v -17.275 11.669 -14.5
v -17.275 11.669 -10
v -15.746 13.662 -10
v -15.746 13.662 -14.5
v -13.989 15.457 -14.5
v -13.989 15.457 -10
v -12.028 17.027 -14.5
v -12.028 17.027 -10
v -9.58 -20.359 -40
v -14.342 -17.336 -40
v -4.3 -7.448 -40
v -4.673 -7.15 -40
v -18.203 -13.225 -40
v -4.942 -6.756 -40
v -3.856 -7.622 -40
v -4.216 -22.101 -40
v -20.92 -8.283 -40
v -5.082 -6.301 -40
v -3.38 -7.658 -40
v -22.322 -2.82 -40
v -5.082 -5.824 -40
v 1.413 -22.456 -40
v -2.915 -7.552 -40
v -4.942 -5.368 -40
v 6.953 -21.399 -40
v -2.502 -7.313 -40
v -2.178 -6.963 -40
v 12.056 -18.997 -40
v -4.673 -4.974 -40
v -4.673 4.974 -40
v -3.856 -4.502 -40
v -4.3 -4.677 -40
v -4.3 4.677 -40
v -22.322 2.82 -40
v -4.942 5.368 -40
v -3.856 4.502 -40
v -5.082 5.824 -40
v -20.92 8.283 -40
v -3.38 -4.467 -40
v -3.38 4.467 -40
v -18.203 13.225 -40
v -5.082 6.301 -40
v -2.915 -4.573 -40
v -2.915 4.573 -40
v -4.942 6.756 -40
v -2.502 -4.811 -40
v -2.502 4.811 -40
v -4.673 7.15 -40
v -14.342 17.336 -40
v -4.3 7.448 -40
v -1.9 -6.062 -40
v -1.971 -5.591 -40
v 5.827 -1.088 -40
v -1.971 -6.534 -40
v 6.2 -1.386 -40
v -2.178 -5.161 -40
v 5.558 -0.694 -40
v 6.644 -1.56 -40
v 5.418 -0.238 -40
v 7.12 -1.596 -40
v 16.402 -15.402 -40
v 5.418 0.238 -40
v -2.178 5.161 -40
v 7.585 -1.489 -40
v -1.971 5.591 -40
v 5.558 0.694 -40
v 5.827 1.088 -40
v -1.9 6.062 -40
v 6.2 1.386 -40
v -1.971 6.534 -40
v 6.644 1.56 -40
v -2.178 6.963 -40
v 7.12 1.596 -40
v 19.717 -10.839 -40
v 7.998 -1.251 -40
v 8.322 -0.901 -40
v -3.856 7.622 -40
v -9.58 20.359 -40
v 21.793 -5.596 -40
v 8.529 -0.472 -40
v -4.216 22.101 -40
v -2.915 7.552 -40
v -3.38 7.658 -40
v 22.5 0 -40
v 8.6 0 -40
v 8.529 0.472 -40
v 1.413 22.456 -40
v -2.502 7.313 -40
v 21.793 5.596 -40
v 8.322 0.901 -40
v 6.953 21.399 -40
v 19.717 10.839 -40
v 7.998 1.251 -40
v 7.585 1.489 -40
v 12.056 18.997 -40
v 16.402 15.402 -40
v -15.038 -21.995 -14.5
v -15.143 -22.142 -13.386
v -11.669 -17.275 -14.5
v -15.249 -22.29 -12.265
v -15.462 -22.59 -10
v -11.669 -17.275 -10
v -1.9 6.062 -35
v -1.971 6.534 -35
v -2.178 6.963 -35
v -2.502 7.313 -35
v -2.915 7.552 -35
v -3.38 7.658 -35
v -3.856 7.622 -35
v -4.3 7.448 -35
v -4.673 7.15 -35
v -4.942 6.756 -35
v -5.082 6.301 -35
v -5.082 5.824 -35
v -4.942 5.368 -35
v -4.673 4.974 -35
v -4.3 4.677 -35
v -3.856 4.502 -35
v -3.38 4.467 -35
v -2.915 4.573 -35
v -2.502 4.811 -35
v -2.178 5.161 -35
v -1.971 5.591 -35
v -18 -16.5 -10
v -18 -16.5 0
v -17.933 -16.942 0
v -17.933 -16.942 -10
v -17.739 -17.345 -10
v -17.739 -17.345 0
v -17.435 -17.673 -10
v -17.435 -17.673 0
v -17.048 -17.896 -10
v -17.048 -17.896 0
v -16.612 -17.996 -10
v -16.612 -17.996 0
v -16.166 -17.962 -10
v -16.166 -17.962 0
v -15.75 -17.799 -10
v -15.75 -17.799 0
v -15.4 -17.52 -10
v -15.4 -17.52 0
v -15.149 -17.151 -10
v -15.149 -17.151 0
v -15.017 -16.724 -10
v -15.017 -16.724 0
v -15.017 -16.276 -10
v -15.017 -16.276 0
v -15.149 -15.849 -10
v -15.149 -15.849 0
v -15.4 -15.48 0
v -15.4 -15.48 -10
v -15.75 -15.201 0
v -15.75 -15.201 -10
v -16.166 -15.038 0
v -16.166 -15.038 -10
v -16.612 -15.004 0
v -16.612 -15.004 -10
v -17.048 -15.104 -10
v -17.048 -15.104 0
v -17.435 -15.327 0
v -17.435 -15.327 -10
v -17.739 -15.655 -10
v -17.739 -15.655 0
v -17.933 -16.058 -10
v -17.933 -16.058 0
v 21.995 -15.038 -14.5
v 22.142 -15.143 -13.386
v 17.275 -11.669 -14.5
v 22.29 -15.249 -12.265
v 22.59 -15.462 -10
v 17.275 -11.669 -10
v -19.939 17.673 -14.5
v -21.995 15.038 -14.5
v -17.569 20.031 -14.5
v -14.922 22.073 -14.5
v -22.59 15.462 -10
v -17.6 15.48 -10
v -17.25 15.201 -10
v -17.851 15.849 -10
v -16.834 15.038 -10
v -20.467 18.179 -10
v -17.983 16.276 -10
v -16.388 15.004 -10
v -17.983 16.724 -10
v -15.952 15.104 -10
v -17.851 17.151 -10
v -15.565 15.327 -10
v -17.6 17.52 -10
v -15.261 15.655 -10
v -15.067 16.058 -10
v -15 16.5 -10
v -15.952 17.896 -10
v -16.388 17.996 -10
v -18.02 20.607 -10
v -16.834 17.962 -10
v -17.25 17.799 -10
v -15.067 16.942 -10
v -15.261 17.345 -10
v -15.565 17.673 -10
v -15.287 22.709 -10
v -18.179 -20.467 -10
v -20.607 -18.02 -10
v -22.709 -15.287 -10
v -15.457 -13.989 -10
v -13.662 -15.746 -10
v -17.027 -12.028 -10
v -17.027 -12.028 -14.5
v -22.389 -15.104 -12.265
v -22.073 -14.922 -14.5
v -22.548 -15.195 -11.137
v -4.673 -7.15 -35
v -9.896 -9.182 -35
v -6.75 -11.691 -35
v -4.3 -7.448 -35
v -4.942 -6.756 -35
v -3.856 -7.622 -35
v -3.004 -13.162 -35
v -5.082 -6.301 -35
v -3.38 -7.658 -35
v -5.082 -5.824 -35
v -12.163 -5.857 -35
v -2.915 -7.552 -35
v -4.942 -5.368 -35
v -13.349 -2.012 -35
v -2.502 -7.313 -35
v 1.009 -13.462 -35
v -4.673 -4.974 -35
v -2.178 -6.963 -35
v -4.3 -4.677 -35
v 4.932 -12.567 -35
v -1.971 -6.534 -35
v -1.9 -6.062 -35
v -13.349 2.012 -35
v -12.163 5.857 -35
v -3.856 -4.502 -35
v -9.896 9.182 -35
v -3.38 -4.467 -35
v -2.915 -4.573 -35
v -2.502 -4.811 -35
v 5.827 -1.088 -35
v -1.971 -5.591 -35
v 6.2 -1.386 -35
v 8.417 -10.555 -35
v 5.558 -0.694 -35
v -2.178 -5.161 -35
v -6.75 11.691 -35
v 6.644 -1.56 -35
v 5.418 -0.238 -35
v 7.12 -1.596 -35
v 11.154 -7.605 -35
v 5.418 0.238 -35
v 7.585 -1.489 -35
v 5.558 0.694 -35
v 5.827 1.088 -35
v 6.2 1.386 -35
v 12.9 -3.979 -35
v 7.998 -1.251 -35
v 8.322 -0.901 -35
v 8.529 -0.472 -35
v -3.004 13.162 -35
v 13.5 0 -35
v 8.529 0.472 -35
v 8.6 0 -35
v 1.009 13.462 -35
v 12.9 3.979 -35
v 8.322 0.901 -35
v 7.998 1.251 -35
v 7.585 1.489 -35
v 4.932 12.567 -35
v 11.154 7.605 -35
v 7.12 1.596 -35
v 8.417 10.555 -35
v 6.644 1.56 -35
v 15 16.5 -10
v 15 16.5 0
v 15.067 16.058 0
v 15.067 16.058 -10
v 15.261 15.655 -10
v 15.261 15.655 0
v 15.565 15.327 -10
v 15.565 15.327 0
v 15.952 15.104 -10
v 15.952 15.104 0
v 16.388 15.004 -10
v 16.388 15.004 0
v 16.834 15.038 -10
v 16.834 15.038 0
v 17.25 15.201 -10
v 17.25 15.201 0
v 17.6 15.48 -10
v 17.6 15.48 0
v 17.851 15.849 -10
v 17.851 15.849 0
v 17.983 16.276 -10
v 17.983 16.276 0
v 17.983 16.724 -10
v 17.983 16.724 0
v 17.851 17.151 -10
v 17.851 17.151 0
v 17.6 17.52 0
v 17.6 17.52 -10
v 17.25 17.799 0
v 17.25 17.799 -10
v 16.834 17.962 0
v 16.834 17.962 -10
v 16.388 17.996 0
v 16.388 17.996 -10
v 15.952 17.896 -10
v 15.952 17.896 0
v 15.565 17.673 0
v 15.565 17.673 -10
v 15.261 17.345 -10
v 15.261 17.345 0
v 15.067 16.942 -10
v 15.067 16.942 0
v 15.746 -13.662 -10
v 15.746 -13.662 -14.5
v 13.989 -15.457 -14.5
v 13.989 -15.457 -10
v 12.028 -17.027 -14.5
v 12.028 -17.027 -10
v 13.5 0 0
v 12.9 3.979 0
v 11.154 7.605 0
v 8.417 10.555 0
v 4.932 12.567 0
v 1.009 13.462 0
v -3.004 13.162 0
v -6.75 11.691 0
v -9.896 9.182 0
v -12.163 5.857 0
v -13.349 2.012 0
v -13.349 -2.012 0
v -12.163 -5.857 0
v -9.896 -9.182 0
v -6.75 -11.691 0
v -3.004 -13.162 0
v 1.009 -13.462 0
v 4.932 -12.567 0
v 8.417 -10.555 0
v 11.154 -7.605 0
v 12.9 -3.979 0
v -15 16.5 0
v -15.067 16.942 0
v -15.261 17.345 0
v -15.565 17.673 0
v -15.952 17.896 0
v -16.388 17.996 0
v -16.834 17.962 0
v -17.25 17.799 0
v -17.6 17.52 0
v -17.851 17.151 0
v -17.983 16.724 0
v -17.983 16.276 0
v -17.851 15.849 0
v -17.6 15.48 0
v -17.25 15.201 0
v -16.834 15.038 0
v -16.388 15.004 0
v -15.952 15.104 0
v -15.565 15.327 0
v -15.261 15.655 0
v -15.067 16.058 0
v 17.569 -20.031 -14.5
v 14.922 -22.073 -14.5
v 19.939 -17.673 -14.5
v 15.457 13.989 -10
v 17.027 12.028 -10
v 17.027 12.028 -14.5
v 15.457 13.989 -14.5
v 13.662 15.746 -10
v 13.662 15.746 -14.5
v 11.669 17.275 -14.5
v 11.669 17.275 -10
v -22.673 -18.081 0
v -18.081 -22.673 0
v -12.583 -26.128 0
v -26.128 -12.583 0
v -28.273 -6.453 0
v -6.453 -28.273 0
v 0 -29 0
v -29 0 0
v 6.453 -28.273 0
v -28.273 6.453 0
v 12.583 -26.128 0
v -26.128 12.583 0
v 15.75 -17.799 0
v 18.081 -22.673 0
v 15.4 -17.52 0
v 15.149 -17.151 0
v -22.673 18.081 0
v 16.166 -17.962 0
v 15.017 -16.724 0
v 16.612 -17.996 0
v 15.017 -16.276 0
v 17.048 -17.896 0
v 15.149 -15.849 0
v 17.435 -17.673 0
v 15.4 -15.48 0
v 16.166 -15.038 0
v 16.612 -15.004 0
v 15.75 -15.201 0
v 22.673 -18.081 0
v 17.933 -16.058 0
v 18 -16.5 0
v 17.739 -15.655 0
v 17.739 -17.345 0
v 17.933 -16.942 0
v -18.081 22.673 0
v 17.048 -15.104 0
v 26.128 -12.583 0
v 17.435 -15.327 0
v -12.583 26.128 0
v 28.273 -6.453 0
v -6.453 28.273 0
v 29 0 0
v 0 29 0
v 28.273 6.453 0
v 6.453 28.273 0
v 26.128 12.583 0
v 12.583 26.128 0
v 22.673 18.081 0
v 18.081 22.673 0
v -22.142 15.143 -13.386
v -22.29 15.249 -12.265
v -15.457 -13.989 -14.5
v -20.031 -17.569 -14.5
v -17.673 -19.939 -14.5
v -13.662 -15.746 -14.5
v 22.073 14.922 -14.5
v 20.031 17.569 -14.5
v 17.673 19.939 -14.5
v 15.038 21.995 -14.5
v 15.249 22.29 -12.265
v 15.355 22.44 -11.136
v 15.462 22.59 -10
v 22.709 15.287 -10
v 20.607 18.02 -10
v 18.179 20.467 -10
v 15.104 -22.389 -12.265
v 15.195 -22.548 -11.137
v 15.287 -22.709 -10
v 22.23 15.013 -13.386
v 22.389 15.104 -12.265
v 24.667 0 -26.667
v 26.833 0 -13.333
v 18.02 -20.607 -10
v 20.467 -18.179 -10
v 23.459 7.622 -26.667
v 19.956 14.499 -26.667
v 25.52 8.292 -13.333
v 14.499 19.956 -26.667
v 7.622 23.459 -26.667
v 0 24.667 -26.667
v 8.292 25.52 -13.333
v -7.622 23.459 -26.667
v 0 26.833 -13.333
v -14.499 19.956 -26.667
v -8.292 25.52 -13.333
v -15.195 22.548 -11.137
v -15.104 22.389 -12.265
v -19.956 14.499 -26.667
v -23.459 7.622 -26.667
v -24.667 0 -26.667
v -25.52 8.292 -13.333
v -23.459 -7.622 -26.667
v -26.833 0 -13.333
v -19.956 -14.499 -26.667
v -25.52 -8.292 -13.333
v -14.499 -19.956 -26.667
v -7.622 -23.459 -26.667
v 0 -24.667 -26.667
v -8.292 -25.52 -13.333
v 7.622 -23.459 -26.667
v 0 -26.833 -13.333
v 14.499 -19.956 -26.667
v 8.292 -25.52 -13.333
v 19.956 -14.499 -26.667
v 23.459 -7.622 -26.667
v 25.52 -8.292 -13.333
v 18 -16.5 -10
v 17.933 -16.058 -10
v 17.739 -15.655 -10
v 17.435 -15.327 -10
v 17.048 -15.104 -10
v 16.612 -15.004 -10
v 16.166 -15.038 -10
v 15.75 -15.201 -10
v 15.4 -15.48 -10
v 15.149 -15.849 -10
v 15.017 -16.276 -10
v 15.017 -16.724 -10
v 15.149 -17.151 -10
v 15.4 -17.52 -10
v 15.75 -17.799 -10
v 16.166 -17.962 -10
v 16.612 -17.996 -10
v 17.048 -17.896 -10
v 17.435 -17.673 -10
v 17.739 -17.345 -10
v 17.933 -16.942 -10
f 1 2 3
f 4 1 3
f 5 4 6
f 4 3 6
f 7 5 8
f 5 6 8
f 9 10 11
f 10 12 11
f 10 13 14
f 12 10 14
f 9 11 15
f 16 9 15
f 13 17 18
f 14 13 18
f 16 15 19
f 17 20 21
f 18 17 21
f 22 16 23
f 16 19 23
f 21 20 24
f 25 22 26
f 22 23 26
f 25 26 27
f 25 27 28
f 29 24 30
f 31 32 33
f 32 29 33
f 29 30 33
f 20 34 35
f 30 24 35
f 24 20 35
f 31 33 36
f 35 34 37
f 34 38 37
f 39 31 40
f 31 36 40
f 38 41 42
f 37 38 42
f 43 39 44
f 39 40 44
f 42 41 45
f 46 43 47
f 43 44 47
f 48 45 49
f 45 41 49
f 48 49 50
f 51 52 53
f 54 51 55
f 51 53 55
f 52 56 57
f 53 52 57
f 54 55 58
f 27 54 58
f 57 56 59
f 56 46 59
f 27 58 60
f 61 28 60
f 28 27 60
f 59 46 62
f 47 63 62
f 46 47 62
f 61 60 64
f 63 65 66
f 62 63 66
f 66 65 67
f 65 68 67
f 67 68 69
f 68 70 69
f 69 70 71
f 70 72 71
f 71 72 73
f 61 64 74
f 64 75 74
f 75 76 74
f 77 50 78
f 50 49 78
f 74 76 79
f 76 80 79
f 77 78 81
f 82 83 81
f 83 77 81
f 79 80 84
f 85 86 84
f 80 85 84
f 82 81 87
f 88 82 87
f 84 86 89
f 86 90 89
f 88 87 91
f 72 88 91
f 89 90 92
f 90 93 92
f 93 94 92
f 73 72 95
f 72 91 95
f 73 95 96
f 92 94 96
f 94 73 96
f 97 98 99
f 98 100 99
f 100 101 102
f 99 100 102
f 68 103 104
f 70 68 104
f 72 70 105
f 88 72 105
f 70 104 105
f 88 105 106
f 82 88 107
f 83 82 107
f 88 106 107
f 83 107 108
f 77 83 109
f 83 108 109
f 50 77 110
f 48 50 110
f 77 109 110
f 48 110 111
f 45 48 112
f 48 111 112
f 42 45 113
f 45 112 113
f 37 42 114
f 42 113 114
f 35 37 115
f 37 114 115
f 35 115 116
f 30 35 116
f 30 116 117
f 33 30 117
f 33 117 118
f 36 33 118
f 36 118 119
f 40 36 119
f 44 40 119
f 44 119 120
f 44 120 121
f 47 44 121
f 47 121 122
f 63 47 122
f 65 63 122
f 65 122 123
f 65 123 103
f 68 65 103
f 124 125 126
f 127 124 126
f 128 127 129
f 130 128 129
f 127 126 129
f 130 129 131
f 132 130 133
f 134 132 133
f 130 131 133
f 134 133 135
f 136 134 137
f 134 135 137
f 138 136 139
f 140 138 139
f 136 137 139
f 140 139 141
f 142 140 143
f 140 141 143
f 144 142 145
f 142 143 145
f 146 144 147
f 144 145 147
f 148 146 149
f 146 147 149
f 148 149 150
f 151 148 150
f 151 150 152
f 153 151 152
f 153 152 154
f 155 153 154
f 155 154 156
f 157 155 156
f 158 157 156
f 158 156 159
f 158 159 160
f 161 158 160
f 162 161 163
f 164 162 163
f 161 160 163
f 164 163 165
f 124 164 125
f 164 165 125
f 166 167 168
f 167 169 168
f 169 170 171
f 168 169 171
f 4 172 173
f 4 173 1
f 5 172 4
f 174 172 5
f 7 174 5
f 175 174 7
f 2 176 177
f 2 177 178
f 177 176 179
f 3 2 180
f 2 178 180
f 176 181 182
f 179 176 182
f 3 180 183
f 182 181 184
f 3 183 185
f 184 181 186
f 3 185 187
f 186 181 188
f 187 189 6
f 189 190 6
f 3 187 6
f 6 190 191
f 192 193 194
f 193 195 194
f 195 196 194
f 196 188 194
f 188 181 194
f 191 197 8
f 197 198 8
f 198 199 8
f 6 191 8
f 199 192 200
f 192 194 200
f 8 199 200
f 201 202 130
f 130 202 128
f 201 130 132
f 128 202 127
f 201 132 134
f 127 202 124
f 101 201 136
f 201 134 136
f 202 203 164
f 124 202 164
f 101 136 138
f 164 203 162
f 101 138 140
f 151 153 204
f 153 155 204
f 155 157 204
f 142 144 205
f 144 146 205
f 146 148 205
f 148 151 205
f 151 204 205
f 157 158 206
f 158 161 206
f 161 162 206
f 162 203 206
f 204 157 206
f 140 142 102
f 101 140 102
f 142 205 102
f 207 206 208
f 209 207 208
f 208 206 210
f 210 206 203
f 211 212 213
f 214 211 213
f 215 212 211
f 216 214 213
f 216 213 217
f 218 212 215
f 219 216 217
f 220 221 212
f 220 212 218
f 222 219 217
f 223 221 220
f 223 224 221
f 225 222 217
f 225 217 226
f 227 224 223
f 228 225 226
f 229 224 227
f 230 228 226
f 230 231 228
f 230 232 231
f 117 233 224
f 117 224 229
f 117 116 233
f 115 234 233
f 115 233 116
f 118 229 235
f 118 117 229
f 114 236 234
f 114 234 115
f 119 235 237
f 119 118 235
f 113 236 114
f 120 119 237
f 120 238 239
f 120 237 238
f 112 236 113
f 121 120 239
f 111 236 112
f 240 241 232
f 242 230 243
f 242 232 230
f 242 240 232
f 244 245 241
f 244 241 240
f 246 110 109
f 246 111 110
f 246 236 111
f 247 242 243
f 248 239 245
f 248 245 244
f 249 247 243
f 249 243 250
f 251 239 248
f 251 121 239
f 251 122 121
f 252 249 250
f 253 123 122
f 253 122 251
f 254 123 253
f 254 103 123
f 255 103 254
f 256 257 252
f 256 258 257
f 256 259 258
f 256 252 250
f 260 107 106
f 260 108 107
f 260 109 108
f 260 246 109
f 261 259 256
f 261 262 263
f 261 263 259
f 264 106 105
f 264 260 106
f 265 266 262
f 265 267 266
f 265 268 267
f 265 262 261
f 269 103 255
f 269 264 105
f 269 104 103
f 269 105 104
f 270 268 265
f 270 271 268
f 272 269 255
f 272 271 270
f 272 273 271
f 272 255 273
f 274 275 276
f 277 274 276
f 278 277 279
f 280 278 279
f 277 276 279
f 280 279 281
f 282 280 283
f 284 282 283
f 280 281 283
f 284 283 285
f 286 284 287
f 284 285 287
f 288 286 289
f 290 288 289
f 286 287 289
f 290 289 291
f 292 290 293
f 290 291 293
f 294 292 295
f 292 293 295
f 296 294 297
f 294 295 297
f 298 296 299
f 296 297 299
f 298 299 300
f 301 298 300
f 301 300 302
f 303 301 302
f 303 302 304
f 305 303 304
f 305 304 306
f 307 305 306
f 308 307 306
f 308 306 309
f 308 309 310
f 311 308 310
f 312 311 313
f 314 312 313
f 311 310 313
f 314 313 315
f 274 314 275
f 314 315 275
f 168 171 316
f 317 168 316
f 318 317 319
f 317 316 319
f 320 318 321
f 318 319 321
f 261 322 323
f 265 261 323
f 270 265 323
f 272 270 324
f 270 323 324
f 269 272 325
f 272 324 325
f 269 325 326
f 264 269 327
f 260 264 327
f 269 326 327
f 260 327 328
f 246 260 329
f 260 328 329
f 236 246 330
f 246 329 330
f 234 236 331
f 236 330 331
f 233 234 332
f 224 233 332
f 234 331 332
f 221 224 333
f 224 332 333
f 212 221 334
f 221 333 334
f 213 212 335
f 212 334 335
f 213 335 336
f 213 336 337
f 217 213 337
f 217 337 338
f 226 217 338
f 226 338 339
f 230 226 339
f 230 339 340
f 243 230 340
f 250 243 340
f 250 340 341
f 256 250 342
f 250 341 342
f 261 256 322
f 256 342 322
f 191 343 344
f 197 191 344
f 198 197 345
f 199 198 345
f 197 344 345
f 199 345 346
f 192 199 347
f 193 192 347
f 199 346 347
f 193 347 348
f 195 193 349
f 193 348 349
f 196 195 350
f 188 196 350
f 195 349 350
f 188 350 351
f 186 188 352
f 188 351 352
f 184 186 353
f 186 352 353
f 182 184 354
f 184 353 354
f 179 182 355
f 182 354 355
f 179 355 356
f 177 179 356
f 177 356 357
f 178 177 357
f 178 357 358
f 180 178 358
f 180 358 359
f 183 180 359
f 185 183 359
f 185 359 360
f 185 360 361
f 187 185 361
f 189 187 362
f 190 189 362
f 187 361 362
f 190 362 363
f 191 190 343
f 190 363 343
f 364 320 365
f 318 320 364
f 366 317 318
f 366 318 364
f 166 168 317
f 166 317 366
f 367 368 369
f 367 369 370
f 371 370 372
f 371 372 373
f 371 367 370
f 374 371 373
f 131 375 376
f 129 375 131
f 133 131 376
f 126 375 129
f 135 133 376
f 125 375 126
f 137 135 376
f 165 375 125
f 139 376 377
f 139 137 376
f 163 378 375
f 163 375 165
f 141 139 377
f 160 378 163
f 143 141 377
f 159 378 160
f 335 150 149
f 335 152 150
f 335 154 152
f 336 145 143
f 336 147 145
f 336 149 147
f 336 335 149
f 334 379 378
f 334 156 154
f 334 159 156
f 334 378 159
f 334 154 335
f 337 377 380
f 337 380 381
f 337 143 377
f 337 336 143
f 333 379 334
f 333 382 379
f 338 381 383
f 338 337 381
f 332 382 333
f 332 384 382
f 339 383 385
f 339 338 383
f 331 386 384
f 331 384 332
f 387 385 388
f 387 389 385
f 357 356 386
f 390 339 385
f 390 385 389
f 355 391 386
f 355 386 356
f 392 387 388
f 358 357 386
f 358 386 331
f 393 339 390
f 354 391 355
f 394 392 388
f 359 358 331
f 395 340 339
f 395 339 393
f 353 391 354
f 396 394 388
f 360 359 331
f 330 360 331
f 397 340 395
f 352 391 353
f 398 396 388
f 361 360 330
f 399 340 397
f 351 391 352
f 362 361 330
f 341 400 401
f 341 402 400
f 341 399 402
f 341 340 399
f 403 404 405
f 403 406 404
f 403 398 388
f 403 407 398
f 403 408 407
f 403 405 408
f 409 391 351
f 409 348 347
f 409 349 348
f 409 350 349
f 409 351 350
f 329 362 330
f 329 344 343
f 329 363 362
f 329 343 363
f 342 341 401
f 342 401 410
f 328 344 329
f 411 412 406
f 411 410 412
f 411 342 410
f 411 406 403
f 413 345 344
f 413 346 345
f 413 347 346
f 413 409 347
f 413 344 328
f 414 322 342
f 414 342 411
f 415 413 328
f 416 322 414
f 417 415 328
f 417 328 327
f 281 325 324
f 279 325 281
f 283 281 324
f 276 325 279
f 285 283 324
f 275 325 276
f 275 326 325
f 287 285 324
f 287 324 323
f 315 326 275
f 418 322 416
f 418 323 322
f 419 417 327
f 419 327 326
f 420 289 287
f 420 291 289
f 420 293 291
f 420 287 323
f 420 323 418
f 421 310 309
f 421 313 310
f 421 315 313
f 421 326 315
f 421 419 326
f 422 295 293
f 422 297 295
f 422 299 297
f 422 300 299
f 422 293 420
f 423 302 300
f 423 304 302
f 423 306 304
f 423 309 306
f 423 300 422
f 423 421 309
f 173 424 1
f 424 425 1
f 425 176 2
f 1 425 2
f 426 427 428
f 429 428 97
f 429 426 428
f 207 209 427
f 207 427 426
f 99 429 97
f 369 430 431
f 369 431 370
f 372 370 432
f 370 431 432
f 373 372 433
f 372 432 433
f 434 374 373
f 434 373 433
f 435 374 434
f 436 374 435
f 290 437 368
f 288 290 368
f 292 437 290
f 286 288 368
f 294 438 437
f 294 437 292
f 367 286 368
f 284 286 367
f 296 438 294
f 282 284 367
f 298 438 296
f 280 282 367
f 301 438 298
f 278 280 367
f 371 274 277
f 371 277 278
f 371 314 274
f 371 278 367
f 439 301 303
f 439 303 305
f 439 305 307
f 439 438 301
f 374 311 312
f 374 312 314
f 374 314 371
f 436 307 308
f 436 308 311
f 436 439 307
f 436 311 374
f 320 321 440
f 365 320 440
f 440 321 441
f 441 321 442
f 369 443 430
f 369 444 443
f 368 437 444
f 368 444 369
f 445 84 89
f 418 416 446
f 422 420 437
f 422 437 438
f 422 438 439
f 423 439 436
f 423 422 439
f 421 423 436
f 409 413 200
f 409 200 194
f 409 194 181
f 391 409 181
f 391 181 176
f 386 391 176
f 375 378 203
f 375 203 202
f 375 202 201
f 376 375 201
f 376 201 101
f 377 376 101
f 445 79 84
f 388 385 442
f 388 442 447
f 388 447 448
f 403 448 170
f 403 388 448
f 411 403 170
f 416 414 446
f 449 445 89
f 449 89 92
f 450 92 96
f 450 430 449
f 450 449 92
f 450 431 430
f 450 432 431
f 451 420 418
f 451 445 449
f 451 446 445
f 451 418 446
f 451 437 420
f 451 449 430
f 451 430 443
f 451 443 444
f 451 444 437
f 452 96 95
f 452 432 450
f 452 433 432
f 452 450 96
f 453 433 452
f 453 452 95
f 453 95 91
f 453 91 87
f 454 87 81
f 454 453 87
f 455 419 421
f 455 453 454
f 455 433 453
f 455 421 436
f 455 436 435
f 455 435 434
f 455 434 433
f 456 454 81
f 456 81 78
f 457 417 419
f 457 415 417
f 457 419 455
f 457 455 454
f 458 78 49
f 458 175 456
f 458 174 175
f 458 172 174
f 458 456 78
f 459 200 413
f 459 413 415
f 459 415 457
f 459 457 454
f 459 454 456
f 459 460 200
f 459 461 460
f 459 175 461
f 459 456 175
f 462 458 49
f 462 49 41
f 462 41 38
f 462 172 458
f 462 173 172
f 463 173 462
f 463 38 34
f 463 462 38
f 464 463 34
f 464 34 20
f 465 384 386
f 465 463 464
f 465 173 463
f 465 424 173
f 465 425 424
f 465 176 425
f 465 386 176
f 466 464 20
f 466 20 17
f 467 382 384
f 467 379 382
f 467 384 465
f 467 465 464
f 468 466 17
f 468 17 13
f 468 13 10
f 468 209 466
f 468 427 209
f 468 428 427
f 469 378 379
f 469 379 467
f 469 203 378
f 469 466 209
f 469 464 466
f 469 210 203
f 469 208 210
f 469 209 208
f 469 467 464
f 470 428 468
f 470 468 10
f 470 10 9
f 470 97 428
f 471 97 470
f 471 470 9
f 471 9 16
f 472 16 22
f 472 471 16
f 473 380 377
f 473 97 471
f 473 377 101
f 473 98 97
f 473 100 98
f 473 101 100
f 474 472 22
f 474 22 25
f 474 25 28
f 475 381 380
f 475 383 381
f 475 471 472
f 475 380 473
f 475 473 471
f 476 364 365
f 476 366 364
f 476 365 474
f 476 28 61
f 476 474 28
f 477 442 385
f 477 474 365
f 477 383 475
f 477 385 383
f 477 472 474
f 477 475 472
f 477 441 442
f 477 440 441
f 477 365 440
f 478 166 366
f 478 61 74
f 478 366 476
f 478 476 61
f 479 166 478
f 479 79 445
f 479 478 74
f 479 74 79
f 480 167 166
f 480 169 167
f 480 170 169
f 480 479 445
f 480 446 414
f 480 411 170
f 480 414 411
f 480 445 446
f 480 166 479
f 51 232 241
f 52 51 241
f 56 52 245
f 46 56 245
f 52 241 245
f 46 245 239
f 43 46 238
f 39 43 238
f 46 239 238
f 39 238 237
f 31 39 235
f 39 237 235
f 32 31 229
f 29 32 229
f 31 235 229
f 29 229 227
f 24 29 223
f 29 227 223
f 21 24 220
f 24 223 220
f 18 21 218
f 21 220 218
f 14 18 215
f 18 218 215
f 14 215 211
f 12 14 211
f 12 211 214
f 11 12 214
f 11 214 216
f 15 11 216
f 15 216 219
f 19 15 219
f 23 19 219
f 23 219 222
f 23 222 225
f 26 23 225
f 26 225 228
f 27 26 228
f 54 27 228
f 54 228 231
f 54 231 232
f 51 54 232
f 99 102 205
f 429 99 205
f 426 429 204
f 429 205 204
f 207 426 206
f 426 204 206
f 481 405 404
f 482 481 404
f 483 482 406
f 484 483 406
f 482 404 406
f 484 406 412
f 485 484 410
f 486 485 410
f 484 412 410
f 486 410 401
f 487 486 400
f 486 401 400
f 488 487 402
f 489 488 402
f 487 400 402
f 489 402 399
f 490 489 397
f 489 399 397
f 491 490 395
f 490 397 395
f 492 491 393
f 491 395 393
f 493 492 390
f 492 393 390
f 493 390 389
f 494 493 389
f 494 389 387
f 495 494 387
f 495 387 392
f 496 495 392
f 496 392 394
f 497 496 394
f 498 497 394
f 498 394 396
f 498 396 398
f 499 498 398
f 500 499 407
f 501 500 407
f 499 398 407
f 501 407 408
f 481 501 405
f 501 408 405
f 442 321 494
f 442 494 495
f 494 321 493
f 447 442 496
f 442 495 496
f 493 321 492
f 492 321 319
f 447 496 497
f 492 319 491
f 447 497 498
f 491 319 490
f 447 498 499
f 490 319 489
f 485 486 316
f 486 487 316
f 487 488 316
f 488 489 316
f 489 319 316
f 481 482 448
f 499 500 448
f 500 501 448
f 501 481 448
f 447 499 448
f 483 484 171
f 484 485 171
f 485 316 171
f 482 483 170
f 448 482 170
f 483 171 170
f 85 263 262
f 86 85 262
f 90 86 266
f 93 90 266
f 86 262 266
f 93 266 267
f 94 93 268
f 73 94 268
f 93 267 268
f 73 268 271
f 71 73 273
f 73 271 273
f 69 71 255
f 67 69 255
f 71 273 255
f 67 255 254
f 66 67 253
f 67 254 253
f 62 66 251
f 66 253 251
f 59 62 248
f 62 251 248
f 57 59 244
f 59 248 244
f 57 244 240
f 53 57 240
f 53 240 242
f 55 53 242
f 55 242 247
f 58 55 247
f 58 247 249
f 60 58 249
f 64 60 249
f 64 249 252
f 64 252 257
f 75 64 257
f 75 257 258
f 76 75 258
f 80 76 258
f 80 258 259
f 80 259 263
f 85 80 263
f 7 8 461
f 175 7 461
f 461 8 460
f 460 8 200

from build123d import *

# Parameters (mm, degrees)
SKETCH1_R           = 29
BOSS_EXTRUDE1_DEPTH = 40
BOSS_EXTRUDE1_DRAFT = -9.23
SKETCH2_R           = 1.5
CUT_EXTRUDE1_DEPTH  = 10
SKETCH4_R           = 13.5
CUT_EXTRUDE3_DEPTH  = 35
SKETCH5_R           = 1.6
CUT_EXTRUDE4_DEPTH  = 35
CUT_EXTRUDE5_DEPTH  = 4.5


with BuildPart() as part:
    # Sketch1 → Boss-Extrude1 (with draft: the straight prism first)
    with BuildSketch(Plane.XY):
        Circle(SKETCH1_R)
    extrude(amount=-BOSS_EXTRUDE1_DEPTH)
    # Boss-Extrude1: the draft: its side faces are tilted about the plane it starts from
    boss_extrude1_sides = [part.faces().sort_by_distance(p)[0] for p in [
        (-29, 0, -20),
    ]]
    draft(boss_extrude1_sides, Plane.XY, BOSS_EXTRUDE1_DRAFT)

    # Sketch2 → Cut-Extrude1 (cut)
    with BuildSketch(Plane.XY):
        with Locations((-16.5, 16.5)):
            Circle(SKETCH2_R)
        with Locations(Location((16.5, 16.5, 0), (0, 0, 180))):
            Circle(SKETCH2_R)
        with Locations((16.5, -16.5)):
            Circle(SKETCH2_R)
        with Locations(Location((-16.5, -16.5, 0), (0, 0, 180))):
            Circle(SKETCH2_R)
    extrude(amount=-CUT_EXTRUDE1_DEPTH, mode=Mode.SUBTRACT)

    # Sketch4 → Cut-Extrude3 (cut)
    with BuildSketch(Plane.XY):
        Circle(SKETCH4_R)
    extrude(amount=-CUT_EXTRUDE3_DEPTH, mode=Mode.SUBTRACT)

    # Sketch5 → Cut-Extrude4 (cut)
    with BuildSketch(Plane.XY.offset(-35)):
        with Locations((7, 0)):
            Circle(SKETCH5_R)
        with Locations((-3.5, -6.062177826)):
            Circle(SKETCH5_R)
        with Locations((-3.5, 6.062177826)):
            Circle(SKETCH5_R)
    extrude(amount=-CUT_EXTRUDE4_DEPTH, mode=Mode.SUBTRACT)

    # Sketch6 → Cut-Extrude5 (cut)
    with BuildSketch(Plane.XY.offset(-10)):
        with BuildLine():
            Line((11.668923699, 17.275154255), (17.761390964, 25.810687075))
            ThreePointArc((17.761390964, 25.810687075), (22.367192771, 21.940083496), (26.14828814, 17.260521534))
            Line((26.14828814, 17.260521534), (17.027183551, 12.027874092))
            ThreePointArc((17.027183551, 12.027874092), (14.585956606, 14.894448789), (11.668923699, 17.275154255))
        make_face()
        with BuildLine():
            Line((12.027874092, -17.027183551), (17.260521534, -26.14828814))
            ThreePointArc((17.260521534, -26.14828814), (21.940083496, -22.367192771), (25.810687075, -17.761390964))
            Line((25.810687075, -17.761390964), (17.275154255, -11.668923699))
            ThreePointArc((17.275154255, -11.668923699), (14.894448789, -14.585956606), (12.027874092, -17.027183551))
        make_face()
        with BuildLine():
            Line((-17.027183551, -12.027874092), (-26.14828814, -17.260521534))
            ThreePointArc((-26.14828814, -17.260521534), (-22.367192771, -21.940083496), (-17.761390964, -25.810687075))
            Line((-17.761390964, -25.810687075), (-11.668923699, -17.275154255))
            ThreePointArc((-11.668923699, -17.275154255), (-14.585956606, -14.894448789), (-17.027183551, -12.027874092))
        make_face()
        with BuildLine():
            Line((-12.027874092, 17.027183551), (-17.260521534, 26.14828814))
            ThreePointArc((-17.260521534, 26.14828814), (-21.940083496, 22.367192771), (-25.810687075, 17.761390964))
            Line((-25.810687075, 17.761390964), (-17.275154255, 11.668923699))
            ThreePointArc((-17.275154255, 11.668923699), (-14.894448789, 14.585956606), (-12.027874092, 17.027183551))
        make_face()
    extrude(amount=-CUT_EXTRUDE5_DEPTH, mode=Mode.SUBTRACT)


solid = part.part
